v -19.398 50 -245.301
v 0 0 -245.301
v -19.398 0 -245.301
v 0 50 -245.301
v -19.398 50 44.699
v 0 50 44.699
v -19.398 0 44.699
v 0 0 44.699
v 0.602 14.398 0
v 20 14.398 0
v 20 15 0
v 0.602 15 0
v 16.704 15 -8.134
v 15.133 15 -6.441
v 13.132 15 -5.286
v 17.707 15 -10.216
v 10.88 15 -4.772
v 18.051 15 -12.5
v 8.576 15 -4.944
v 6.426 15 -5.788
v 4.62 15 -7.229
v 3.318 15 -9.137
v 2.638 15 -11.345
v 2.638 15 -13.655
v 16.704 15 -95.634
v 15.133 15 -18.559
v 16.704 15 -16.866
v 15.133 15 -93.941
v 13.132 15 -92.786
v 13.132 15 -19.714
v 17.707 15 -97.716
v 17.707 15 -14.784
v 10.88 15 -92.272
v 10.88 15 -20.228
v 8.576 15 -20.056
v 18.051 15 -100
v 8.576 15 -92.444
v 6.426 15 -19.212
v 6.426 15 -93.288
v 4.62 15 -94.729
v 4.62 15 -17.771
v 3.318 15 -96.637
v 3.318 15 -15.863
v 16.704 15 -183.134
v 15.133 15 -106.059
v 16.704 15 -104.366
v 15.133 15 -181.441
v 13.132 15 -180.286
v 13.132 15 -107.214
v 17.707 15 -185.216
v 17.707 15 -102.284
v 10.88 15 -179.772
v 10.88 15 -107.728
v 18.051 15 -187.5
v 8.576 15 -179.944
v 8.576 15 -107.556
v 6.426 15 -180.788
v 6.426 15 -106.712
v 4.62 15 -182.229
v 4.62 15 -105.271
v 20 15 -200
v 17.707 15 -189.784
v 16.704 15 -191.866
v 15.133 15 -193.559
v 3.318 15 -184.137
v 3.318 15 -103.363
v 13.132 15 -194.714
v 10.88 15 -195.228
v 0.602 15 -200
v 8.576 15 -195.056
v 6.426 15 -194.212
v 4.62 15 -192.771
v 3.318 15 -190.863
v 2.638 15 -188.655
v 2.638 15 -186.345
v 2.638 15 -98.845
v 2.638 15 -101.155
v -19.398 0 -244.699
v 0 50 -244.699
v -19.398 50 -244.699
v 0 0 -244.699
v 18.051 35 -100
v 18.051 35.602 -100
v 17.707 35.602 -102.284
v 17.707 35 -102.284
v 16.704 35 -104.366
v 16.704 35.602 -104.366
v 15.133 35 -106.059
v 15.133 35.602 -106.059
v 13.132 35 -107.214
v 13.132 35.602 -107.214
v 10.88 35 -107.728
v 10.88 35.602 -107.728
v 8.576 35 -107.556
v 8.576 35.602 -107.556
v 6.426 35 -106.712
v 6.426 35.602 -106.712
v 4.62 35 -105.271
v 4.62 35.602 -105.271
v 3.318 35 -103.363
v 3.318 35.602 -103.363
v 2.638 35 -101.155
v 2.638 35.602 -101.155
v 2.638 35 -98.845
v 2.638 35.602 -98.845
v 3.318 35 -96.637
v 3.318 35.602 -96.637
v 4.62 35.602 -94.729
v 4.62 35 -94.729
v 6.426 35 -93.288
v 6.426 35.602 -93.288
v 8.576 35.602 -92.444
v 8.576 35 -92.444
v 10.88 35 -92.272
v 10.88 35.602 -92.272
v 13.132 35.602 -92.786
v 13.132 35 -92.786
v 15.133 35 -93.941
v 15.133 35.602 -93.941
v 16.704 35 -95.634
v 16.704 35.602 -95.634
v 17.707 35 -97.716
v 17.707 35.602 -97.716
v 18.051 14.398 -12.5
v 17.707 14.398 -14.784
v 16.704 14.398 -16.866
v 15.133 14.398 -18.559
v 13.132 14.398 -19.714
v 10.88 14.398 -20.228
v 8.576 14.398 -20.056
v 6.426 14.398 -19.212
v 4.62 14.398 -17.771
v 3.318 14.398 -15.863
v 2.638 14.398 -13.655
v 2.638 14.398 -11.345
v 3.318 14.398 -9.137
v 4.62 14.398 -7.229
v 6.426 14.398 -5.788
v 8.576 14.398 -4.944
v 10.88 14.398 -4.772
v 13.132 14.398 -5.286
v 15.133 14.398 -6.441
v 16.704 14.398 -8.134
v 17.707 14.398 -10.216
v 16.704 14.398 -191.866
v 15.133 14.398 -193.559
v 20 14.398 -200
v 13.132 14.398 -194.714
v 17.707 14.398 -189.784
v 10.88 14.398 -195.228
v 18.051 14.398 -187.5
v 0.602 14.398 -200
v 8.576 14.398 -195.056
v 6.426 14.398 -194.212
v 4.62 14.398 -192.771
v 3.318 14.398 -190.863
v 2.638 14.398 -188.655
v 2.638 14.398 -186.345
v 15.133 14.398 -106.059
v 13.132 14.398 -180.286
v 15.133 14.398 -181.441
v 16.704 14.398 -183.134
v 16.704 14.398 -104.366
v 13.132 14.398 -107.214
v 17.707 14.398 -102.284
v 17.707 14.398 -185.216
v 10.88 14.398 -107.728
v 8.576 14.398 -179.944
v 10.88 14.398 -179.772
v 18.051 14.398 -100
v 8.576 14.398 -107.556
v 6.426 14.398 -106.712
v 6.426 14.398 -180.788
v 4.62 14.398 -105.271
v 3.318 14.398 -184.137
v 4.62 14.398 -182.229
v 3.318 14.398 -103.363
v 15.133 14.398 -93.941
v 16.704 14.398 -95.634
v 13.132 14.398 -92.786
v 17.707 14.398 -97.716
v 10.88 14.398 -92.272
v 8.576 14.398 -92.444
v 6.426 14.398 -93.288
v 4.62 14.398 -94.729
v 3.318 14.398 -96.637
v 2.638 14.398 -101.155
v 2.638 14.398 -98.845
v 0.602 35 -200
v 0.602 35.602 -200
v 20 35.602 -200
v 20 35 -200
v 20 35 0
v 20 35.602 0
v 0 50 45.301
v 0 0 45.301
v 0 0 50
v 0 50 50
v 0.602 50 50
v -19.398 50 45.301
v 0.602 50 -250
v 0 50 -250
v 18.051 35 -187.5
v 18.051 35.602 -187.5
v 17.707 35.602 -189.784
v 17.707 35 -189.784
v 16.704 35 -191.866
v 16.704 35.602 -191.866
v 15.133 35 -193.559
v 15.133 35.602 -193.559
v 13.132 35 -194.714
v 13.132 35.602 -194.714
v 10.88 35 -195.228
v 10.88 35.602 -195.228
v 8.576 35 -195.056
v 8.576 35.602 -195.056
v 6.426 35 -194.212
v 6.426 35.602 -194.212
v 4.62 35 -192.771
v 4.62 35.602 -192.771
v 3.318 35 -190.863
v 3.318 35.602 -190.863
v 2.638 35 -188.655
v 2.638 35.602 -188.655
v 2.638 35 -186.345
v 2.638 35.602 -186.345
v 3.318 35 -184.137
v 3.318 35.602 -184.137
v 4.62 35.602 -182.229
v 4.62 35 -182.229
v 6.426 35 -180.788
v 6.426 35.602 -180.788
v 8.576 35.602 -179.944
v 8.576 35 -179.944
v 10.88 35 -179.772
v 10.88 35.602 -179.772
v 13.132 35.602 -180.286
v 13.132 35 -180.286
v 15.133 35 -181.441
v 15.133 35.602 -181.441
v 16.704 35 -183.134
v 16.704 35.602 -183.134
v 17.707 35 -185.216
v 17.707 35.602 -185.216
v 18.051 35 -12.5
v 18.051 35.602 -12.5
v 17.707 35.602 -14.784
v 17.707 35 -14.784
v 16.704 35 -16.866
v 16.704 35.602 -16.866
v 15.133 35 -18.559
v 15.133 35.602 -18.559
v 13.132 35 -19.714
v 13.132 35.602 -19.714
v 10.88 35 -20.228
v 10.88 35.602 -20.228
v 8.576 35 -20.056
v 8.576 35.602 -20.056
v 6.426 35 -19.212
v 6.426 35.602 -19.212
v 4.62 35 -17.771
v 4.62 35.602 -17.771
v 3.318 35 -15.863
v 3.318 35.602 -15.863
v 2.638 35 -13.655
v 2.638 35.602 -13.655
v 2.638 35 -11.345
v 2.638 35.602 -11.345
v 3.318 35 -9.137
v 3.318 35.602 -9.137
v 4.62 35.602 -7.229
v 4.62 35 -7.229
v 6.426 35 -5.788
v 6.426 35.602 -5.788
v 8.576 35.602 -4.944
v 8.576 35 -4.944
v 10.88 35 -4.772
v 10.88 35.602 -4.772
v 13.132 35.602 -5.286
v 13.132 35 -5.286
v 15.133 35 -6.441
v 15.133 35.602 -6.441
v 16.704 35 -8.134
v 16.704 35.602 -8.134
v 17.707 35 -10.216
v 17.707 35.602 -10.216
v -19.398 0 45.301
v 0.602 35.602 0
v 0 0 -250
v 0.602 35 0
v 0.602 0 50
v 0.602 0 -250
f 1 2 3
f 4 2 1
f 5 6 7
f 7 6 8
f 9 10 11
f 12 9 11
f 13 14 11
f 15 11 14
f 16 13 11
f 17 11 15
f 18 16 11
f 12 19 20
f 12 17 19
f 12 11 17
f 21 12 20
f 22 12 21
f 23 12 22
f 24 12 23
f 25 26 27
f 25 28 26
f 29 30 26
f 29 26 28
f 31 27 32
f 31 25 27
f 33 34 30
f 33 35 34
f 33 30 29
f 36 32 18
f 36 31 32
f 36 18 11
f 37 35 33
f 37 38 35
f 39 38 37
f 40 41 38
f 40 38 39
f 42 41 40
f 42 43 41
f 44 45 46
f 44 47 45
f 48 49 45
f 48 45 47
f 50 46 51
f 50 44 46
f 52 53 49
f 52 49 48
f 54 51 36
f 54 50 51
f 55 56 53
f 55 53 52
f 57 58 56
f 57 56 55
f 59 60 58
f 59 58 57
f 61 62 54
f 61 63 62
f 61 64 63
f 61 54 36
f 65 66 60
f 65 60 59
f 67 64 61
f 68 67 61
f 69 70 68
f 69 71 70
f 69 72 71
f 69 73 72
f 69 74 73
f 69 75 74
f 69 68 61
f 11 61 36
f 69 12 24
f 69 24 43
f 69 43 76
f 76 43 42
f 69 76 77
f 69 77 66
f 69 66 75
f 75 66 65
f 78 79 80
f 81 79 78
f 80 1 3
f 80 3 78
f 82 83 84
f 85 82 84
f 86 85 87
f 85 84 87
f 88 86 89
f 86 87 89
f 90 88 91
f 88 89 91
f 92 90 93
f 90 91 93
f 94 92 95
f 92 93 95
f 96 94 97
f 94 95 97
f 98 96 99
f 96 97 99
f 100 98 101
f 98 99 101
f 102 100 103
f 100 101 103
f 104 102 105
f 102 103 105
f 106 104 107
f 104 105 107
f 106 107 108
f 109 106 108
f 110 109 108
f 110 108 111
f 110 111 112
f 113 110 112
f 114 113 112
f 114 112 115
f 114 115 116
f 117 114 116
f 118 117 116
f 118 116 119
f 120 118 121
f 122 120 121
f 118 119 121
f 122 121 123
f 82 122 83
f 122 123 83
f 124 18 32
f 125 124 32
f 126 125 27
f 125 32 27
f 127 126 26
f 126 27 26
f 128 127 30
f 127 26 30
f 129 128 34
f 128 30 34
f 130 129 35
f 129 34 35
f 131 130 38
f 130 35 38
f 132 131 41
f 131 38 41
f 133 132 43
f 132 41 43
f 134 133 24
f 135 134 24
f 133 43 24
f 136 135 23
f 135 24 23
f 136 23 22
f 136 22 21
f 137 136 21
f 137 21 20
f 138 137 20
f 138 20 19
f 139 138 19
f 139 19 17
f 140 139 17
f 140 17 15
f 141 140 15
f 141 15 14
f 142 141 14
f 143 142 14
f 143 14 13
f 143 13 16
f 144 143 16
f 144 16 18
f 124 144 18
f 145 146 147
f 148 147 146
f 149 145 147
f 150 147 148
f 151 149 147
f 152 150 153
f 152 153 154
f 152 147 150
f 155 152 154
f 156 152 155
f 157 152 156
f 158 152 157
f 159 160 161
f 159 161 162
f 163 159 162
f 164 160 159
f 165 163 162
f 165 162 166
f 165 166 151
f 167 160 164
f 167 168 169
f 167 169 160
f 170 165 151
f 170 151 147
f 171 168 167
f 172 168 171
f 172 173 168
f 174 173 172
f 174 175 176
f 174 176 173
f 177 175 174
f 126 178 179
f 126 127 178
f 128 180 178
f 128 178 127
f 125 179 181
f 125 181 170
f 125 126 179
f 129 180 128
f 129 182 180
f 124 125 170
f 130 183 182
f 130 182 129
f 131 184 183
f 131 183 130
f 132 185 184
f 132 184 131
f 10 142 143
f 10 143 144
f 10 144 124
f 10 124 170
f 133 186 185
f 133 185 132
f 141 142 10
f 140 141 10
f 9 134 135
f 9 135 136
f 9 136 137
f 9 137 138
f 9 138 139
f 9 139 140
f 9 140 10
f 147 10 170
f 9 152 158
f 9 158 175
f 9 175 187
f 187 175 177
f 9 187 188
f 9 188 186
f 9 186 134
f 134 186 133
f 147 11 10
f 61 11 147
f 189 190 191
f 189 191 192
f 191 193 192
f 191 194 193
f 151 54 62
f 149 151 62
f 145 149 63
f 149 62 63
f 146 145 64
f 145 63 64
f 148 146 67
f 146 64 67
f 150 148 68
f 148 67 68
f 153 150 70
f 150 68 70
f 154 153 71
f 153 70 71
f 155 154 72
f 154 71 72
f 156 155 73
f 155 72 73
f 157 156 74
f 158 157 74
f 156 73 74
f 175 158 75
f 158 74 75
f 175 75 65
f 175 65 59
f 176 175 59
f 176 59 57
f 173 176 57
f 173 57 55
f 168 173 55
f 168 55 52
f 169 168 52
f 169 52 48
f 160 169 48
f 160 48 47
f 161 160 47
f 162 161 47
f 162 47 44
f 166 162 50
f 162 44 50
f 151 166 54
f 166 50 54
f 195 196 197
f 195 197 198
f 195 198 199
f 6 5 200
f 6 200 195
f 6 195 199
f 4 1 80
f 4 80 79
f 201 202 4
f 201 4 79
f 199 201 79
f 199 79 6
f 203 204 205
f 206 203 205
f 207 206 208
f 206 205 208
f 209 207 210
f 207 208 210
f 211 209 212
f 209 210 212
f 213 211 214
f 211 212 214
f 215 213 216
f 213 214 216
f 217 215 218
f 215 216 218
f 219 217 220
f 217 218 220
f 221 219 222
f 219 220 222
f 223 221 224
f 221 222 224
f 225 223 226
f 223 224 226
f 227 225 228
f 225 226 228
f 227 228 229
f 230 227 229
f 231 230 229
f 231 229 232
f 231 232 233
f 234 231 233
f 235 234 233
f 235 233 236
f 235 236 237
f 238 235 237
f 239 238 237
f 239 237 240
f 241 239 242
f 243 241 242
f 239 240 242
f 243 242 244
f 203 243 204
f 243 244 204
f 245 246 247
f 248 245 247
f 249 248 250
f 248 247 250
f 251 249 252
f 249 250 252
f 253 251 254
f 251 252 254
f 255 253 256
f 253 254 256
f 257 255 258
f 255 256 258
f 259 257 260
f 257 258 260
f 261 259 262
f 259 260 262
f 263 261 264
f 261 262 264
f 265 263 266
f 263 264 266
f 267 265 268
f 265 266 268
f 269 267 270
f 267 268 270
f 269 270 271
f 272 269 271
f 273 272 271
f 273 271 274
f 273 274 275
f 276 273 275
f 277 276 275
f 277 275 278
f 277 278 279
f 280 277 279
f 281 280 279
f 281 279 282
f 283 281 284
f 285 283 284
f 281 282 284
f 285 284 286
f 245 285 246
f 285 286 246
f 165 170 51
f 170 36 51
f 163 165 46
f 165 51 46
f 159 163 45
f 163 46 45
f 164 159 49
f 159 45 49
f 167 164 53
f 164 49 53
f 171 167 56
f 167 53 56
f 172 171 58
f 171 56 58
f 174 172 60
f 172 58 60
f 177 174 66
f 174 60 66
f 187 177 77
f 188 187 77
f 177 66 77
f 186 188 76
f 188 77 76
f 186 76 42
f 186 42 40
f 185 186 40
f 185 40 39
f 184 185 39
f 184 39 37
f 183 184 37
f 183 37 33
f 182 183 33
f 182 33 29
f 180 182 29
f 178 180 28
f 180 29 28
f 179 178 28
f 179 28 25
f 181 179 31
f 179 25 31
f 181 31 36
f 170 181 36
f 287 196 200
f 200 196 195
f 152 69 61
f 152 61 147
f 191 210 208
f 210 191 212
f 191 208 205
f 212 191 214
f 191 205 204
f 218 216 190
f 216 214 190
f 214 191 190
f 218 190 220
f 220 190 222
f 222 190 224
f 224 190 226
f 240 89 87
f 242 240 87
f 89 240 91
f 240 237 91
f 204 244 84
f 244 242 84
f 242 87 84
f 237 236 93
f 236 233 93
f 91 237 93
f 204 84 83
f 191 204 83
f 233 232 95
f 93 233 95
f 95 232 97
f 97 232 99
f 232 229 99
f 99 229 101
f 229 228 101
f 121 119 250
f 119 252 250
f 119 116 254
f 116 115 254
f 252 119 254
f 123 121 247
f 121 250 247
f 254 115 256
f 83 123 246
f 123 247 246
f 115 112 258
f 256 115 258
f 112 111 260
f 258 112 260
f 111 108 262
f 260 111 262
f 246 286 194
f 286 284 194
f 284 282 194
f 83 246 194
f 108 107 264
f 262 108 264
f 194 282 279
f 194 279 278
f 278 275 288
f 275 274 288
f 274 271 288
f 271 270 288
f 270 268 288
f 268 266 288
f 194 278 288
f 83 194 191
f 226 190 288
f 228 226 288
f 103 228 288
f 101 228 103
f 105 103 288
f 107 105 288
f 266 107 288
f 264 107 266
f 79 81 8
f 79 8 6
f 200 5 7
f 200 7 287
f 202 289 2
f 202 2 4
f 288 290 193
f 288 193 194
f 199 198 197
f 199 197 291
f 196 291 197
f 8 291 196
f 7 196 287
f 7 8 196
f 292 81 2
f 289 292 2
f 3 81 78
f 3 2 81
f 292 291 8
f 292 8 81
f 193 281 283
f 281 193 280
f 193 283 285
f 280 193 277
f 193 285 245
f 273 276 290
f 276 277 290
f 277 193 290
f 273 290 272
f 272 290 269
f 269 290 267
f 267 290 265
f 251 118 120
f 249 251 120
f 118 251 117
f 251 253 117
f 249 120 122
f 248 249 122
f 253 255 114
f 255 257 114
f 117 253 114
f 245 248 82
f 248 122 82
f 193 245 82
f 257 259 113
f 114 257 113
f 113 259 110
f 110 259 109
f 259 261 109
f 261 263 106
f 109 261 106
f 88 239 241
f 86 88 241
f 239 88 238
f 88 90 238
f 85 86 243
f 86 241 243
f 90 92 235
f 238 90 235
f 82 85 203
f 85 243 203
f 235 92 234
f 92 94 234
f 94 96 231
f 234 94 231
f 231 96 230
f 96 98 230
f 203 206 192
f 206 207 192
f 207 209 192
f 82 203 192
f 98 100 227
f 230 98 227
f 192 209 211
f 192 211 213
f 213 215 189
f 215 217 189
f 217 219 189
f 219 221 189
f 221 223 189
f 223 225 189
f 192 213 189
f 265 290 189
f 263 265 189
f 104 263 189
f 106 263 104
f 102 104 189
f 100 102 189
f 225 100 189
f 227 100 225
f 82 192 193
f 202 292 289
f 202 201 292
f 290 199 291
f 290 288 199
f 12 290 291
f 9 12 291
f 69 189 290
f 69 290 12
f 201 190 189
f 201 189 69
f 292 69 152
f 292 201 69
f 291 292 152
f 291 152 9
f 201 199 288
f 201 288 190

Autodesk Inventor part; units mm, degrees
ref_plane "YZ Plane" through (0, 0, 0) normal (1, 0, 0) x (0, 1, 0)
ref_plane "XZ Plane" through (0, 0, 0) normal (0, 1, 0) x (-1, 0, 0)
ref_plane "XY Plane" through (0, 0, 0) normal (0, 0, 1) x (1, 0, 0)
sketch "Sketch1" plane through (0, 0, 0) normal (1, 0, 0) x (0, 1, 0)
  line L0 (0, 0) -> (50, 0)
  line L1 (50, 0) -> (50, -200)
  line L2 (50, -200) -> (0, -200)
  line L3 (0, -200) -> (0, 0)
  dimension "d0" = 50
  dimension "d1" = 200
extrude "Extrusion1" add sketch "Sketch1" along normal blind 0.602
sketch "Sketch2" plane through (0.602, 0, 0) normal (1, 0, 0) x (0, 0, -1)
  line L0 (200, 50) -> (0, 50) projected
  line L1 (0, 50) -> (100, 50)
  line L2 (100, 50) -> (100, 35)
  line L3 (0, 0) -> (100, 0)
  line L4 (100, 0) -> (100, 15)
  line L5 (100, 35) -> (200, 35)
  line L6 (200, 0) -> (200, 50) projected
  line L7 (200, 35) -> (200, 35.602)
  line L8 (200, 35.602) -> (0, 35.602)
  line L9 (0, 50) -> (0, 0) projected
  line L10 (0, 35.602) -> (0, 35)
  line L11 (0, 35) -> (100, 35)
  line L12 (100, 15) -> (200, 15)
  line L13 (200, 15) -> (200, 14.398)
  line L14 (200, 14.398) -> (0, 14.398)
  line L15 (0, 14.398) -> (0, 15)
  line L16 (0, 15) -> (100, 15)
  dimension "d4" = 100
  dimension "d5" = 15
  dimension "d6" = 100
  dimension "d7" = 15
  dimension "d9" = 200
  dimension "d13" = 200
extrude "Extrusion2" add sketch "Sketch2" along normal blind 19.398 contours L6 L5 L2 L8 | L2 L11 L9 L8 | L6 L14 L4 L12 | L4 L14 L9 L16
sketch "Sketch4" plane through (0.602, 35.602, 0) normal (0, 1, 0) x (1, 0, 0)
  line L0 (-0.602, 0) -> (0, 0) projected
  line L1 (0, 0) -> (0, 12.5)
  line L2 (0, 5) -> (0, 0) projected
  line L3 (0, 12.5) -> (9.699, 12.5)
  line L4 (9.699, 12.5) -> (9.699, 100)
  line L5 (9.699, 100) -> (9.699, 187.5)
  circle A0 centre (9.699, 12.5) radius 7.75
  circle A1 centre (9.699, 100) radius 7.75
  circle A2 centre (9.699, 187.5) radius 7.75
  dimension "d33" = 12.5
  dimension "d34" = 9.699
  dimension "d39" = 15.5
  dimension "d40" = 15.5
  dimension "d41" = 15.5
  dimension "d49" = 87.5
  dimension "d50" = 87.5
extrude "Extrusion4" cut sketch "Sketch4" against normal through all
sketch "Sketch6" plane through (0.602, 15, -200) normal (0, 0, -1) x (-1, 0, 0)
  point P0 (0.602, -15)
sketch "Sketch7" plane through (0, 0, -200) normal (0, 0, -1) x (-1, 0, 0)
  point P0 (0, 0)
sketch "Sketch8" plane through (0, 0, -200) normal (0, 0, -1) x (-1, 0, 0)
  line L0 (-0.602, 50) -> (-0.602, 35.602) projected
  line L1 (-0.602, 50) -> (-0.602, 0)
  line L2 (-0.602, 0) -> (0, 0)
  line L3 (0, 0) -> (0, 50)
  line L4 (0, 50) -> (-0.602, 50)
extrude "Extrusion6" add sketch "Sketch8" along normal blind 50
sketch "Sketch9" plane through (0, 0, 0) normal (0, 0, 1) x (1, 0, 0)
  line L0 (0, 0) -> (0, 50) projected
  line L1 (0, 0) -> (0, 50)
  line L2 (0, 50) -> (0.602, 50)
  line L3 (0.602, 50) -> (0.602, 0)
  line L4 (0.602, 0) -> (0, 0)
  dimension "d53" = 0.602
extrude "Extrusion7" add sketch "Sketch9" along normal blind 50
sketch "Sketch10" plane through (0, 0, 0) normal (-1, 0, 0) x (0, 0, 1)
  line L0 (0, 0) -> (-100, 0)
  line L1 (-250, 0) -> (50, 0) projected
  line L2 (-100, 0) -> (-100, 25)
  line L3 (-100, 25) -> (45, 25)
  line L4 (-100, 25) -> (-245, 25)
  line L5 (45.301, 50) -> (44.699, 50)
  line L6 (44.699, 50) -> (44.699, 0)
  line L7 (44.699, 0) -> (45.301, 0)
  line L8 (45.301, 0) -> (45.301, 50)
  line L9 (45.301, 50) -> (44.699, 0) construction
  line L10 (44.699, 50) -> (45.301, 0) construction
  line L11 (-245.301, 50) -> (-244.699, 50)
  line L12 (-244.699, 50) -> (-244.699, 0)
  line L13 (-244.699, 0) -> (-245.301, 0)
  line L14 (-245.301, 0) -> (-245.301, 50)
  line L15 (-245.301, 50) -> (-244.699, 0) construction
  line L16 (-244.699, 50) -> (-245.301, 0) construction
  dimension "d56" = 100
  dimension "d57" = 25
  dimension "d58" = 145
  dimension "d59" = 145
  dimension "d60" = 0.602
  dimension "d61" = 50
  dimension "d62" = 0.602
  dimension "d63" = 50
extrude "Extrusion8" add sketch "Sketch10" along normal blind 19.398 contours L6 L5 L8 L1 | L1 L14 L11 L12
sketch "Sketch11" plane through (0, 0, 45.301) normal (0, 0, 1) x (1, 0, 0)
  line L0 (0, 0) -> (-19.398, 0) projected
  line L1 (-19.398, 50) -> (-19.398, 0) projected
  line L2 (-19.398, 0) -> (-19.398, 10)
  line L3 (-19.398, 10) -> (-9.699, 10)
  line L4 (-9.699, 10) -> (-9.699, 40)
  circle A0 centre (-9.699, 10) radius 7.75
  circle A1 centre (-9.699, 40) radius 7.75
  dimension "d71" = 10
  dimension "d72" = 30
  dimension "d73" = 15.5
  dimension "d74" = 15.5
extrude "Extrusion9" [suppressed]
sketch "Sketch12" plane through (0.602, 0, 0) normal (1, 0, 0) x (0, 0, -1)
  point P0 (0, 0)
sketch "Sketch13" plane through (0.602, 50, 50) normal (0, 1, 0) x (1, 0, 0)
  point P0 (-0.602, 50)
sketch "Sketch14" plane through (0.602, 50, 50) normal (0, 1, 0) x (1, 0, 0)
  point P0 (-0.602, 50)
sketch "Sketch15" plane through (0, 0, 0) normal (-1, 0, 0) x (0, 0, 1)
  point P0 (0, 0)
equation "\"BendRadius\" = Thickness"
equation "\"BendReliefWidth\" = Thickness"
equation "\"BendReliefDepth\" = 0.5 * Thickness"
equation "\"CornerReliefSize\" = 4 * Thickness"
equation "\"MinimumRemnant\" = 2 * Thickness"
equation "\"TransitionRadius\" = BendRadius"
equation "\"JacobiRadiusSize\" = BendRadius"
equation "\"GapSize\" = Thickness"
equation "\"Thickness\" = 0.602"
properties part number "claw platform" material "Steel, Galvanized"
